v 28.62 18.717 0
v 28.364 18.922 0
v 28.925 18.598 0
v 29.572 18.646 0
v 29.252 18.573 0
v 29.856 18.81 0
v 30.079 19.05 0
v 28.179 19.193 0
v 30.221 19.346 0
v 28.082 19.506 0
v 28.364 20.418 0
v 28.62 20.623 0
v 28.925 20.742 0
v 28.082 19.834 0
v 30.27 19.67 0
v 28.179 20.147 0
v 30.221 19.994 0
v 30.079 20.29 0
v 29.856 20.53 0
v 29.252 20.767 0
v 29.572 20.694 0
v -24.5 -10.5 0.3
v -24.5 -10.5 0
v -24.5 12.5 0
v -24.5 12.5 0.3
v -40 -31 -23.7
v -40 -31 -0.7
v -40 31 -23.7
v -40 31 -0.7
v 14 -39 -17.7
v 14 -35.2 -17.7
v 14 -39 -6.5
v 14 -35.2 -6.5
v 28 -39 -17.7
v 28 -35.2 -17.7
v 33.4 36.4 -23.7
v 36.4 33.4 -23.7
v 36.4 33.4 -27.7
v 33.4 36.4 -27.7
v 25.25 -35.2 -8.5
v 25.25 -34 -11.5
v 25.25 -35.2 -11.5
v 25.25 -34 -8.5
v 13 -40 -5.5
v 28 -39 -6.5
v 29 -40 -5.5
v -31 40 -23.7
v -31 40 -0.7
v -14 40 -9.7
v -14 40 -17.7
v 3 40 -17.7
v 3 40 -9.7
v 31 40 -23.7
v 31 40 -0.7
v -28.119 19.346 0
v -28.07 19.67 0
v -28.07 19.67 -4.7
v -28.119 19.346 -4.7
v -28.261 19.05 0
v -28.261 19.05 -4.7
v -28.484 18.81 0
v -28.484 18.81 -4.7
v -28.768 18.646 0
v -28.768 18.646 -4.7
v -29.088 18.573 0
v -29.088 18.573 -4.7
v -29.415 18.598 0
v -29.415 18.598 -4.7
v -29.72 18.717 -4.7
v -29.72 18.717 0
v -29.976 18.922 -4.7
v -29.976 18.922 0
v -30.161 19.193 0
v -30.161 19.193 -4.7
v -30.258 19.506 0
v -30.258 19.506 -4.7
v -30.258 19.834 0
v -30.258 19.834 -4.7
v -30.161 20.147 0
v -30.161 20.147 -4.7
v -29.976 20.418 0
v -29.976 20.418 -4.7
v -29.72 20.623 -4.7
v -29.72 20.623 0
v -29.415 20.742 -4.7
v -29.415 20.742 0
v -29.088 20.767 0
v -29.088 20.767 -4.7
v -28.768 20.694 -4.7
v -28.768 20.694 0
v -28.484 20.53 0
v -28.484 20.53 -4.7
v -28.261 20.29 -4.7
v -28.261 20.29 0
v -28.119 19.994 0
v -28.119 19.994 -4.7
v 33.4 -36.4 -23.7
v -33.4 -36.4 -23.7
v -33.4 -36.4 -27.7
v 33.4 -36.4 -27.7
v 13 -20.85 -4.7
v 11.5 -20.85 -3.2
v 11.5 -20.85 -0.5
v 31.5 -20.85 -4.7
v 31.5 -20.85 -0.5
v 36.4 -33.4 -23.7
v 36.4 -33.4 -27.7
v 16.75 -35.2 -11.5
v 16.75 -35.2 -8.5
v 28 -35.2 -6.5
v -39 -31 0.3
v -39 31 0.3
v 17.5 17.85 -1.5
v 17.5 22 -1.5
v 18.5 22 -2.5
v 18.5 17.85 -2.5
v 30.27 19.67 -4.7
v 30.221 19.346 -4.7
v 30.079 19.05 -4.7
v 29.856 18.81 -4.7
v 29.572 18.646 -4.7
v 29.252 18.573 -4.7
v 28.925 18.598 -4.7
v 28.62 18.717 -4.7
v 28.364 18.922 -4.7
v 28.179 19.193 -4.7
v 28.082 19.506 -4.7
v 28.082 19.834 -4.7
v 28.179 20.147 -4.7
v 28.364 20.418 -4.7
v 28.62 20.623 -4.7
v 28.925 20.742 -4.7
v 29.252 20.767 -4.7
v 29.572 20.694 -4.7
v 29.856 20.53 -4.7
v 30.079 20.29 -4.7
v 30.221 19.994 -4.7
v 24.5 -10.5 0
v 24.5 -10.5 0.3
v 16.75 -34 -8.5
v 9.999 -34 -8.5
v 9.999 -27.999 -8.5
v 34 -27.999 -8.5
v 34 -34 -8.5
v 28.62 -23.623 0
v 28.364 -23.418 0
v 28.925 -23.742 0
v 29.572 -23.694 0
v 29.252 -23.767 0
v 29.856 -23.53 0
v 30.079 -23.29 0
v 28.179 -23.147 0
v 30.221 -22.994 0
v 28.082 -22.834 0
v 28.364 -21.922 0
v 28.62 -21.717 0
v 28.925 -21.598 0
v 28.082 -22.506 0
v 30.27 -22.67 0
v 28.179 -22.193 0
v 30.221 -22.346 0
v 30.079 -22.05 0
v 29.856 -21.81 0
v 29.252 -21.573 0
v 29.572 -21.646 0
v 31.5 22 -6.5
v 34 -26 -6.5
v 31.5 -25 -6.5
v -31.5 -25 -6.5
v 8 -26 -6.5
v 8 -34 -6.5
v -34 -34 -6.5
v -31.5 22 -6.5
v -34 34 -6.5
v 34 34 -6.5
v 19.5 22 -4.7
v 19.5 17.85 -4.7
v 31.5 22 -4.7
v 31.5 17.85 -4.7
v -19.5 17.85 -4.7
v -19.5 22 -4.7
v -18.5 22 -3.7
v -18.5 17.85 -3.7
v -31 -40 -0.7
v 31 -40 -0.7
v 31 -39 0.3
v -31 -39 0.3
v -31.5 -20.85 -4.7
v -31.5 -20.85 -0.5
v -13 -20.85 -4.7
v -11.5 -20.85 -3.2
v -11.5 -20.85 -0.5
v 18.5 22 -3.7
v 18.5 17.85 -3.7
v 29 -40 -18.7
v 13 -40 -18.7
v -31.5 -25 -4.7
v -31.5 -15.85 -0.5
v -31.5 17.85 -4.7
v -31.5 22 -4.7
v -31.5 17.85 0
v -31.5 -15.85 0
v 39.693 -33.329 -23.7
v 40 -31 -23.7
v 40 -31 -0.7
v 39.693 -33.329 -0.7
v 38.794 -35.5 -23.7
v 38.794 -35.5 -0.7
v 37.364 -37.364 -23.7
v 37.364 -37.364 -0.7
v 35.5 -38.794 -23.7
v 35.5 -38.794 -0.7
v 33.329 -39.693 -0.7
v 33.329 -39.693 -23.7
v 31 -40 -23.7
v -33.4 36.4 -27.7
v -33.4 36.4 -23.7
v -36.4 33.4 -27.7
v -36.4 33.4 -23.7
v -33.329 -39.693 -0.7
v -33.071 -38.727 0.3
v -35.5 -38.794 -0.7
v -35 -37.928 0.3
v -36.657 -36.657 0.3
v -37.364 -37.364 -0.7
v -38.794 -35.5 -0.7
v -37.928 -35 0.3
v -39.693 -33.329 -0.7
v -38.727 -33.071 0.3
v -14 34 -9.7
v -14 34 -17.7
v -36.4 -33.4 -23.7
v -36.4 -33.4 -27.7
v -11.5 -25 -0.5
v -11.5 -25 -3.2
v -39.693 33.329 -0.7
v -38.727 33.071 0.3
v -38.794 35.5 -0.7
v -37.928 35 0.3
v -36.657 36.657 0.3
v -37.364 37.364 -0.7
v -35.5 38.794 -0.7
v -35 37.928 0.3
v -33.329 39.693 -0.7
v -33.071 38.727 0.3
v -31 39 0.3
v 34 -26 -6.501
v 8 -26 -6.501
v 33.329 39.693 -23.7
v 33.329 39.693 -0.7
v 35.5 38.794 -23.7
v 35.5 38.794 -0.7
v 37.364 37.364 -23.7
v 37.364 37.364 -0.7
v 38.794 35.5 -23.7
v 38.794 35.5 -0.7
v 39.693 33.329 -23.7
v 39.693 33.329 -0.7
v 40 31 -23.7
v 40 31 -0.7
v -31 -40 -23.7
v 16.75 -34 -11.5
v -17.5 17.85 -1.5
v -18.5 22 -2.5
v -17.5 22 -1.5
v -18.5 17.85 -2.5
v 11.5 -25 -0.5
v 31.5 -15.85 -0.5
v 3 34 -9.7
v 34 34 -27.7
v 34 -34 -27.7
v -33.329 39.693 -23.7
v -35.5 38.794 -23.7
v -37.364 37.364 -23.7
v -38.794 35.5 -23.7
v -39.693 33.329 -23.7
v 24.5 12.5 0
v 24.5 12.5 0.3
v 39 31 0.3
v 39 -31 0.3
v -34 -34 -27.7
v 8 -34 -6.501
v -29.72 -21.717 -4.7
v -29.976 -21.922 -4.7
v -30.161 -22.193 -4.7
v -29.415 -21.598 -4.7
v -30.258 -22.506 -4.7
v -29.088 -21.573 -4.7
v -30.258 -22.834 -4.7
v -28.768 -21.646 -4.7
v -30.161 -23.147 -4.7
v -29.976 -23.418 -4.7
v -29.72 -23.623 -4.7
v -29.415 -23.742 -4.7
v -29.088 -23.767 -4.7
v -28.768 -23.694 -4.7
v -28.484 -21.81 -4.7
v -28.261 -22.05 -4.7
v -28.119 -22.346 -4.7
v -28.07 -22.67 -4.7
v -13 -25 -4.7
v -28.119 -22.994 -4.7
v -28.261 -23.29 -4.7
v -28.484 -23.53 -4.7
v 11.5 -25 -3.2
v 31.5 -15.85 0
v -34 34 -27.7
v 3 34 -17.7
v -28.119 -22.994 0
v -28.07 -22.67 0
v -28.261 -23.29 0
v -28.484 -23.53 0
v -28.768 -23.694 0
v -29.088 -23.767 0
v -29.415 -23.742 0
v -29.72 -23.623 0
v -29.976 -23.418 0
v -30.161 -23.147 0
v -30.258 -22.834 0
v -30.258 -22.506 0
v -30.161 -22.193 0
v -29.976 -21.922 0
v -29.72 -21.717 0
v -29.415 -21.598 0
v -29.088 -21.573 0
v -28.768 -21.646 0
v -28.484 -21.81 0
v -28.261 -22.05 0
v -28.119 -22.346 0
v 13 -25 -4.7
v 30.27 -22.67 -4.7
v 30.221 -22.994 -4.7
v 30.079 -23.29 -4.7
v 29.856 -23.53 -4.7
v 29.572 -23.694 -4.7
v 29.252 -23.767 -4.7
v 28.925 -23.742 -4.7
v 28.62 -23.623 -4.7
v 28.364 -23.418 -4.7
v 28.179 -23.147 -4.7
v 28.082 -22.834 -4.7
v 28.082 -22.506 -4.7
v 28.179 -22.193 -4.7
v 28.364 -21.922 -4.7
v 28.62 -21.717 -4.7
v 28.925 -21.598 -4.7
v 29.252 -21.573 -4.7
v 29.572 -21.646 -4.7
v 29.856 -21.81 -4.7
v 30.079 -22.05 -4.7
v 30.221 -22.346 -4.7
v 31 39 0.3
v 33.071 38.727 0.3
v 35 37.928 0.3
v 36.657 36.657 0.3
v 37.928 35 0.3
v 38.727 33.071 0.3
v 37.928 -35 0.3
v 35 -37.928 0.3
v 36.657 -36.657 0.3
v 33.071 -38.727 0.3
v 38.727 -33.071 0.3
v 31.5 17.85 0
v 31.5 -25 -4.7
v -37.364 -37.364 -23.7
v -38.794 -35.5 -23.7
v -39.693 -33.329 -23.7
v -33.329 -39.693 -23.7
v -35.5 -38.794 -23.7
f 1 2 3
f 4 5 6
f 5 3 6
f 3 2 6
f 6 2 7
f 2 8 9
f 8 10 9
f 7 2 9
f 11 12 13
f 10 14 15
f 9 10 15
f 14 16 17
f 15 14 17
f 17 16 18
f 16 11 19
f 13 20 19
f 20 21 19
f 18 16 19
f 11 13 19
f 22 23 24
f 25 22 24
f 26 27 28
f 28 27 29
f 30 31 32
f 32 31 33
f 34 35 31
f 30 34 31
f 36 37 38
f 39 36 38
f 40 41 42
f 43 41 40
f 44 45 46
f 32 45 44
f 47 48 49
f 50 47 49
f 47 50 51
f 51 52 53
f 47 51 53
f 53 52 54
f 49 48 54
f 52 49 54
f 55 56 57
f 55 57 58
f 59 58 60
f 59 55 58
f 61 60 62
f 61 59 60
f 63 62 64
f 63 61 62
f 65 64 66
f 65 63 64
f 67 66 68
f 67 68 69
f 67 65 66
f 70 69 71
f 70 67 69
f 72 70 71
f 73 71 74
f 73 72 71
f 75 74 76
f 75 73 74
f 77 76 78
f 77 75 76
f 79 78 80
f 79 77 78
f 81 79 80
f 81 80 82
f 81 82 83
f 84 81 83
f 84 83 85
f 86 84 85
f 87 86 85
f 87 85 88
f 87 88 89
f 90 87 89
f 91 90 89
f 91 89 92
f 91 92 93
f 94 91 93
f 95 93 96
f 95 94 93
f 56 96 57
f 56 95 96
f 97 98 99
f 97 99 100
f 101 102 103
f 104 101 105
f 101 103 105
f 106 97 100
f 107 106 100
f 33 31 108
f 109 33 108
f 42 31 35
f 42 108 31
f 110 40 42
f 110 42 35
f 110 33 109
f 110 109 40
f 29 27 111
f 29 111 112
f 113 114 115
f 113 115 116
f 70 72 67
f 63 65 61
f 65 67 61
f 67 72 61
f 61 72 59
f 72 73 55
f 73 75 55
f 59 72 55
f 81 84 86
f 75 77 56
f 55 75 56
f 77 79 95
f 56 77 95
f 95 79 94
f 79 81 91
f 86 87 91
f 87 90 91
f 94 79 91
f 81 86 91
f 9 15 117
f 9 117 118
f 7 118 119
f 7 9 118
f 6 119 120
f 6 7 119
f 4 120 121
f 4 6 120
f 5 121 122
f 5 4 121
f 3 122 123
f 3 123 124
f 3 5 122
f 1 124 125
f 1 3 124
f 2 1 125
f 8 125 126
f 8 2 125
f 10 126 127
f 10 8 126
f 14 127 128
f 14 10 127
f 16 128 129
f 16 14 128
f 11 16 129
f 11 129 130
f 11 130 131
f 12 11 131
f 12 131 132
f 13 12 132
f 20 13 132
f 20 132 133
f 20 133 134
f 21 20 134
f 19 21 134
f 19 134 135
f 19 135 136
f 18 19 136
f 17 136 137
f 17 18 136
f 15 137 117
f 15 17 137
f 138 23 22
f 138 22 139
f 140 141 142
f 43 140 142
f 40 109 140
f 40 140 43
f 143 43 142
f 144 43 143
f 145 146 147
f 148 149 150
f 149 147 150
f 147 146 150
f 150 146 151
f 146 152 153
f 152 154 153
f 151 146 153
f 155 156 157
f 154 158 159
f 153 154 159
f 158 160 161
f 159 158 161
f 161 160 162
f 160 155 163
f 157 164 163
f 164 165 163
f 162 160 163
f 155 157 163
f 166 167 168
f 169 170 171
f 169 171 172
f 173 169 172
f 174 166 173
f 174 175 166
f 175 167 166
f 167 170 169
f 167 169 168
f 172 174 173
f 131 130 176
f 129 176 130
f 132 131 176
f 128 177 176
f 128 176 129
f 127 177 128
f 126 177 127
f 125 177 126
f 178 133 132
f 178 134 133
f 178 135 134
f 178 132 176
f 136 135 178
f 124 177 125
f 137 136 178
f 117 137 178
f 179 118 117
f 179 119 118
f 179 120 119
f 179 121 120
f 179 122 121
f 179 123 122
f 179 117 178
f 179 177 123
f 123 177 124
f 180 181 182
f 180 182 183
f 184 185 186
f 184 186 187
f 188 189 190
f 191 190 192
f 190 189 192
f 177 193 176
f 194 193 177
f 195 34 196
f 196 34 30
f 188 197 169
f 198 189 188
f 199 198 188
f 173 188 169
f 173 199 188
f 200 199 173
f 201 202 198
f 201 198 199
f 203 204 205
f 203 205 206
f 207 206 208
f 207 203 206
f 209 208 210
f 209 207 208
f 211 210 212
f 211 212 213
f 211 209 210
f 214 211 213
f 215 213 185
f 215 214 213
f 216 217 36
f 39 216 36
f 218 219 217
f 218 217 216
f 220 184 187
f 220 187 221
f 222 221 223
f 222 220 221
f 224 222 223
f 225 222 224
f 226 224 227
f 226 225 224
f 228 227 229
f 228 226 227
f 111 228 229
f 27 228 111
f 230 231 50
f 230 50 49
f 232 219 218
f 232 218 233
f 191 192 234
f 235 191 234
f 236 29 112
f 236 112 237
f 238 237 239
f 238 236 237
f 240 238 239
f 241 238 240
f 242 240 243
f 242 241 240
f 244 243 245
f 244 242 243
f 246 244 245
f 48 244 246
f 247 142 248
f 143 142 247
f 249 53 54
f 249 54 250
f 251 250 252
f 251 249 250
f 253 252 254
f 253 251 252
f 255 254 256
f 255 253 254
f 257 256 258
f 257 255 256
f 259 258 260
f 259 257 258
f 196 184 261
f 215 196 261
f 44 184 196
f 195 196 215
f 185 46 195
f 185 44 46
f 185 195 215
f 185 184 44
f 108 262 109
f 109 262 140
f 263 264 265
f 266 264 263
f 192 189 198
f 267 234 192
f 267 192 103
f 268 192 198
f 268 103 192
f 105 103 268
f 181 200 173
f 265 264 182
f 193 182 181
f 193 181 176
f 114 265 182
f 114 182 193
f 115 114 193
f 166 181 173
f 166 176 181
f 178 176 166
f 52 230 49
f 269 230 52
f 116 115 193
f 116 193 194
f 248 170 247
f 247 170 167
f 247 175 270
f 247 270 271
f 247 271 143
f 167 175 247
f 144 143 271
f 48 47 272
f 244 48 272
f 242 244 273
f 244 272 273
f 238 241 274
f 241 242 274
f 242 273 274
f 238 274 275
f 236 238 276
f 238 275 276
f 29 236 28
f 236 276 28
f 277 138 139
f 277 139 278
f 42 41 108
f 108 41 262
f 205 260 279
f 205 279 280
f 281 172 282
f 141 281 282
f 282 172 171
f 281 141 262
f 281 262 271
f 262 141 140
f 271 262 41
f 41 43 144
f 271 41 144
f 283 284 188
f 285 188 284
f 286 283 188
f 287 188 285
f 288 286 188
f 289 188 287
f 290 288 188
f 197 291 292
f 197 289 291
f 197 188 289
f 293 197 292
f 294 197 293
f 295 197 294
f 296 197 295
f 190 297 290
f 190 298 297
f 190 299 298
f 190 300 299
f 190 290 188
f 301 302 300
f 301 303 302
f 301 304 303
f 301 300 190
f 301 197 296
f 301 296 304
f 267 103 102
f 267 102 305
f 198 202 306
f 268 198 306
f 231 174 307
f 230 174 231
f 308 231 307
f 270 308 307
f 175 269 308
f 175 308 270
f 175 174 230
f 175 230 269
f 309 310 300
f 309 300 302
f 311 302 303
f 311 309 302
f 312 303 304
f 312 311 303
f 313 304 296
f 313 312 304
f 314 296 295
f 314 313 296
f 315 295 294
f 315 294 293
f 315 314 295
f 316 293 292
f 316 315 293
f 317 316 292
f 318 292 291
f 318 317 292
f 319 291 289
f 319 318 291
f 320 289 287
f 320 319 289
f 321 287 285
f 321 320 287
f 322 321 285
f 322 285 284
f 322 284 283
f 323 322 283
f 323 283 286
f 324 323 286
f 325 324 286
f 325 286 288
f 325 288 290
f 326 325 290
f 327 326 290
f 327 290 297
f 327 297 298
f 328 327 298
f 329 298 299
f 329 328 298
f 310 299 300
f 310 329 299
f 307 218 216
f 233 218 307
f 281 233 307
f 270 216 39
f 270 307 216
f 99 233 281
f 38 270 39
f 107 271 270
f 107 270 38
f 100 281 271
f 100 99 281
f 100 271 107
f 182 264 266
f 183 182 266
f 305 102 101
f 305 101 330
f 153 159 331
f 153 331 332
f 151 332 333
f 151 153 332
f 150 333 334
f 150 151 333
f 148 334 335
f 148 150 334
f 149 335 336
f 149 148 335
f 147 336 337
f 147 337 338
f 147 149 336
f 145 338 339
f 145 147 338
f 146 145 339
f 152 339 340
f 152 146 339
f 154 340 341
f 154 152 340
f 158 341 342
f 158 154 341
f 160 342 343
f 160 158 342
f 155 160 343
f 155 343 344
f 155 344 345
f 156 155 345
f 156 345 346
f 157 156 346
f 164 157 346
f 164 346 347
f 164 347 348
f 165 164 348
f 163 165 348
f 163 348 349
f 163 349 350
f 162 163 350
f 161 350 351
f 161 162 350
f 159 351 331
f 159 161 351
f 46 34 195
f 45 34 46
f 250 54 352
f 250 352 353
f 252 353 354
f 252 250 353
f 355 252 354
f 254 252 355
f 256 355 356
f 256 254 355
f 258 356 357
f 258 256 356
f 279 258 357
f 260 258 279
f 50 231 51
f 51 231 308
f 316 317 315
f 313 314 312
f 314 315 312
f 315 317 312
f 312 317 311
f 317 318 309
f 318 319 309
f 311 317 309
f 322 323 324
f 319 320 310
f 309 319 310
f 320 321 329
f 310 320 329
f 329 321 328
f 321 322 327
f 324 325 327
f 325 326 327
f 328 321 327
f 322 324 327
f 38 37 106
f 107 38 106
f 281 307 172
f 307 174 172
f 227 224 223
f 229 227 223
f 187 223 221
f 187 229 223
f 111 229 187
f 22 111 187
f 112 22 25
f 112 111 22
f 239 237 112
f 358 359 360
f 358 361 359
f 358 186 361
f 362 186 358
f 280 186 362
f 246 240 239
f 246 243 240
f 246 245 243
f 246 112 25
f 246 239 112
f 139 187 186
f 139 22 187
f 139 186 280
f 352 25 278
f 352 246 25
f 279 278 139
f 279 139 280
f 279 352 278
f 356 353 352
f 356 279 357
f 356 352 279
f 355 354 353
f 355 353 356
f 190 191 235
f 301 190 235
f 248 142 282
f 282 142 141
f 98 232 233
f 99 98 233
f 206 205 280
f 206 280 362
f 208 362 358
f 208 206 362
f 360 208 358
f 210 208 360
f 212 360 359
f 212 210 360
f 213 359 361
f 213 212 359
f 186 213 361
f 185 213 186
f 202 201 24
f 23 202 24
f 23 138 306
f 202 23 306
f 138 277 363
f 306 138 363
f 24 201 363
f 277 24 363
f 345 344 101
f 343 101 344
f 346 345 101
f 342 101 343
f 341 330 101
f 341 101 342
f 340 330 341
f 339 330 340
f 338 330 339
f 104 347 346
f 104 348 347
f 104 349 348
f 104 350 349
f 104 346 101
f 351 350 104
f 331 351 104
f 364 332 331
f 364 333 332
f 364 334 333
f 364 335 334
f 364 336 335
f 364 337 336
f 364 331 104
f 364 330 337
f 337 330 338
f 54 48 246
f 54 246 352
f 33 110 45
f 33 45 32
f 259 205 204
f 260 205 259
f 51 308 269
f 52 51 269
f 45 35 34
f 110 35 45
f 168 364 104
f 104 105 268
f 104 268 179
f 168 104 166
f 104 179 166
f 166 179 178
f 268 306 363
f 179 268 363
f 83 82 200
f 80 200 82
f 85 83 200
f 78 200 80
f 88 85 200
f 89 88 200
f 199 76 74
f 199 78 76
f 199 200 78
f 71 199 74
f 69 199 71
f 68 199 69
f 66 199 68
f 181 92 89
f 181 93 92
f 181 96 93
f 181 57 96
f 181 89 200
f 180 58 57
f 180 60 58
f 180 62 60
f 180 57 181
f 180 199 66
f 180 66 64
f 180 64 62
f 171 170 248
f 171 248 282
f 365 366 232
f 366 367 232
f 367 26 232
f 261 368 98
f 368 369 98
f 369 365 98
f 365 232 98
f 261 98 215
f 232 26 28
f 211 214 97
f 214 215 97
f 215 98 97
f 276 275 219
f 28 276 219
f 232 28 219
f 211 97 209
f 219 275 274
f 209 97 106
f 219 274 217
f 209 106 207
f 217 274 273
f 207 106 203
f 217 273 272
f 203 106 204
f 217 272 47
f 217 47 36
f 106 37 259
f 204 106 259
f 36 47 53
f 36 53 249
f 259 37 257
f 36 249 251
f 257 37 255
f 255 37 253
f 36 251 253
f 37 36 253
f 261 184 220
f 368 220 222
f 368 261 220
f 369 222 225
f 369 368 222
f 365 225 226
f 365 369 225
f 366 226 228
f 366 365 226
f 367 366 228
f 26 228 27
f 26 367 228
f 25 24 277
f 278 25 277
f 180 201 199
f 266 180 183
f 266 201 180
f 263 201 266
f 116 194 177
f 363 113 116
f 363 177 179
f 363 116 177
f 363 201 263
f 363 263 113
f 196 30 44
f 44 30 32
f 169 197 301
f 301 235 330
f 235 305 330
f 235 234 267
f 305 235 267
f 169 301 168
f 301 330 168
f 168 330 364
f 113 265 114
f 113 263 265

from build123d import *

# Parameters (mm, degrees)
SKETCH_W        = 63
SKETCH_H        = 47
SKETCH_W_2      = 49
SKETCH_H_2      = 23
PAD_DEPTH       = 0.3
SKETCH001_W     = 65
SKETCH001_H     = 49
SKETCH001_W_2   = 63
SKETCH001_H_2   = 47
PAD001_DEPTH    = 6.8
SKETCH002_W     = 4.15
SKETCH002_H     = 4.15
SKETCH002_R     = 1.1
PAD002_DEPTH    = 4.7
SKETCH003_W     = 8.85
SKETCH003_H     = 4.15
SKETCH003_W_2   = 15.85
PAD003_DEPTH    = 4.7
SKETCH004_W     = 37
SKETCH004_H     = 4.15
PAD004_DEPTH    = 1.5
CHAMFER_SIZE    = 1
PAD005_DEPTH    = 0.5
CHAMFER001_SIZE = 1.5
SKETCH006_W     = 80
SKETCH006_H     = 80
SKETCH006_W_2   = 65
SKETCH006_H_2   = 49
PAD006_DEPTH    = 24
SKETCH007_W     = 68
SKETCH007_H     = 68
SKETCH007_W_2   = 65
SKETCH007_H_2   = 49
POCKET_DEPTH    = 17.2
SKETCH008_W     = 14
SKETCH008_H     = 11.2
POCKET001_DEPTH = 6
SKETCH009_W     = 17
SKETCH009_H     = 8
POCKET002_DEPTH = 6
SKETCH010_W     = 26
SKETCH010_H     = 8
PAD007_DEPTH    = 2
CHAMFER002_SIZE = 1.999
SKETCH011_W     = 14
SKETCH011_H     = 1.2
PAD008_DEPTH    = 11.2
SKETCH012_W     = 8.5
SKETCH012_H     = 3
POCKET003_DEPTH = 1.2
SKETCH013_W     = 72.8
SKETCH013_H     = 72.8
SKETCH013_W_2   = 68
SKETCH013_H_2   = 68
PAD009_DEPTH    = 4
FILLET_R        = 9
CHAMFER003_SIZE = 3
CHAMFER004_SIZE = 1
CHAMFER005_SIZE = 1


with BuildPart() as part:
    # Sketch → Pad (new body)
    with BuildSketch(Plane.XY):
        with Locations((0, -1.5)):
            Rectangle(SKETCH_W, SKETCH_H)
        with Locations((0, 1)):
            Rectangle(SKETCH_W_2, SKETCH_H_2, mode=Mode.SUBTRACT)
    extrude(amount=PAD_DEPTH)

    # Sketch001 (on Face10 of Pad) → Pad001 (join)
    with BuildSketch(Plane.XY.offset(0.3)):
        with Locations((0, -1.5)):
            Rectangle(SKETCH001_W, SKETCH001_H)
        with Locations((0, -1.5)):
            Rectangle(SKETCH001_W_2, SKETCH001_H_2, mode=Mode.SUBTRACT)
    extrude(amount=-PAD001_DEPTH)

    # Sketch002 (on Face4 of Pad001) → Pad002 (join)
    with BuildSketch(Plane(origin=(0, 0, 0), x_dir=(1, 0, 0), z_dir=(0, 0, -1))):
        with Locations((-29.425, 22.925)):
            Rectangle(SKETCH002_W, SKETCH002_H)
        with Locations((-29.17, 22.67)):
            Circle(SKETCH002_R, mode=Mode.SUBTRACT)
        with Locations((-29.425, -19.925)):
            Rectangle(SKETCH002_W, SKETCH002_H)
        with Locations((-29.17, -19.67)):
            Circle(SKETCH002_R, mode=Mode.SUBTRACT)
        with Locations((29.425, -19.925)):
            Rectangle(SKETCH002_W, SKETCH002_H)
        with Locations((29.17, -19.67)):
            Circle(SKETCH002_R, mode=Mode.SUBTRACT)
        with Locations((29.425, 22.925)):
            Rectangle(SKETCH002_W, SKETCH002_H)
        with Locations((29.17, 22.67)):
            Circle(SKETCH002_R, mode=Mode.SUBTRACT)
    extrude(amount=PAD002_DEPTH)

    # Sketch003 (on Face4 of Pad002) → Pad003 (join)
    with BuildSketch(Plane(origin=(0, 0, 0), x_dir=(1, 0, 0), z_dir=(0, 0, -1))):
        with Locations((-22.925, -19.925)):
            Rectangle(SKETCH003_W, SKETCH003_H)
        with Locations((22.925, -19.925)):
            Rectangle(SKETCH003_W, SKETCH003_H)
        with Locations((-19.425, 22.925)):
            Rectangle(SKETCH003_W_2, SKETCH003_H)
        with Locations((19.425, 22.925)):
            Rectangle(SKETCH003_W_2, SKETCH003_H)
    extrude(amount=PAD003_DEPTH)

    # Sketch004 (on Face4 of Pad003) → Pad004 (join)
    with BuildSketch(Plane(origin=(0, 0, 0), x_dir=(1, 0, 0), z_dir=(0, 0, -1))):
        with Locations((0, -19.925)):
            Rectangle(SKETCH004_W, SKETCH004_H)
    extrude(amount=PAD004_DEPTH)

    # Chamfer
    chamfer_edges = [part.edges().sort_by_distance(p)[0] for p in [
        (-18.5, 19.925, -1.5),
        (18.5, 19.925, -1.5),
        (-18.5, 19.925, -4.7),
        (18.5, 19.925, -4.7),
    ]]
    chamfer(chamfer_edges, length=CHAMFER_SIZE)

    # Sketch005 (on Face6 of Chamfer) → Pad005 (join)
    with BuildSketch(Plane(origin=(0, 0, 0), x_dir=(1, 0, 0), z_dir=(0, 0, -1))):
        Polygon((11.5, 20.85), (11.5, 25), (-11.5, 25), (-11.5, 20.85), (-31.5, 20.85), (-31.5, 15.85), (31.5, 15.85), (31.5, 20.85), align=None)
    extrude(amount=PAD005_DEPTH)

    # Chamfer001
    chamfer001_edges = [part.edges().sort_by_distance(p)[0] for p in [
        (-11.5, -22.925, -4.7),
        (11.5, -22.925, -4.7),
    ]]
    chamfer(chamfer001_edges, length=CHAMFER001_SIZE)

    # Sketch006 (on Face52 of Chamfer001) → Pad006 (join)
    with BuildSketch(Plane.XY.offset(0.3)):
        Rectangle(SKETCH006_W, SKETCH006_H)
        with Locations((0, -1.5)):
            Rectangle(SKETCH006_W_2, SKETCH006_H_2, mode=Mode.SUBTRACT)
    extrude(amount=-PAD006_DEPTH)

    # Sketch007 (on Face49 of Pad006) → Pocket (cut)
    with BuildSketch(Plane(origin=(0, 0, -23.7), x_dir=(1, 0, 0), z_dir=(0, 0, -1))):
        Rectangle(SKETCH007_W, SKETCH007_H)
        with Locations((0, 1.5)):
            Rectangle(SKETCH007_W_2, SKETCH007_H_2, mode=Mode.SUBTRACT)
    extrude(amount=-POCKET_DEPTH, mode=Mode.SUBTRACT)

    # Sketch008 (on Face49 of Pocket) → Pocket001 (cut)
    with BuildSketch(Plane(origin=(0, -34, 0), x_dir=(-1, 0, 0), z_dir=(0, 1, 0))):
        with Locations((-21, -12.1)):
            Rectangle(SKETCH008_W, SKETCH008_H)
    extrude(amount=-POCKET001_DEPTH, mode=Mode.SUBTRACT)

    # Sketch009 (on Face47 of Pocket001) → Pocket002 (cut)
    with BuildSketch(Plane.XZ.offset(-34)):
        with Locations((-5.5, -13.7)):
            Rectangle(SKETCH009_W, SKETCH009_H)
    extrude(amount=-POCKET002_DEPTH, mode=Mode.SUBTRACT)

    # Sketch010 (on Face24 of Pocket002) → Pad007 (join)
    with BuildSketch(Plane(origin=(0, 0, -6.5), x_dir=(1, 0, 0), z_dir=(0, 0, -1))):
        with Locations((21, 30)):
            Rectangle(SKETCH010_W, SKETCH010_H)
    extrude(amount=PAD007_DEPTH)

    # Chamfer002
    chamfer002_edges = [part.edges().sort_by_distance(p)[0] for p in [
        (21, -26, -8.5),
        (8, -30, -8.5),
    ]]
    chamfer(chamfer002_edges, length=CHAMFER002_SIZE)

    # Sketch011 (on Face55 of Chamfer002) → Pad008 (join)
    with BuildSketch(Plane(origin=(0, 0, -6.5), x_dir=(1, 0, 0), z_dir=(0, 0, -1))):
        with Locations((21, 34.6)):
            Rectangle(SKETCH011_W, SKETCH011_H)
    extrude(amount=PAD008_DEPTH)

    # Sketch012 (on Face17 of Pad008) → Pocket003 (cut)
    with BuildSketch(Plane(origin=(0, -34, 0), x_dir=(-1, 0, 0), z_dir=(0, 1, 0))):
        with Locations((-21, -10)):
            Rectangle(SKETCH012_W, SKETCH012_H)
    extrude(amount=-POCKET003_DEPTH, mode=Mode.SUBTRACT)

    # Sketch013 (on Face15 of Pocket003) → Pad009 (join)
    with BuildSketch(Plane(origin=(0, 0, -23.7), x_dir=(1, 0, 0), z_dir=(0, 0, -1))):
        Rectangle(SKETCH013_W, SKETCH013_H)
        Rectangle(SKETCH013_W_2, SKETCH013_H_2, mode=Mode.SUBTRACT)
    extrude(amount=PAD009_DEPTH)

    # Fillet
    fillet_edges = [part.edges().sort_by_distance(p)[0] for p in [
        (-40, -40, -11.7),
        (40, -40, -11.7),
        (40, 40, -11.7),
        (-40, 40, -11.7),
    ]]
    fillet(fillet_edges, radius=FILLET_R)

    # Chamfer003
    chamfer003_edges = [part.edges().sort_by_distance(p)[0] for p in [
        (36.4, 36.4, -25.7),
        (-36.4, 36.4, -25.7),
        (36.4, -36.4, -25.7),
        (-36.4, -36.4, -25.7),
    ]]
    chamfer(chamfer003_edges, length=CHAMFER003_SIZE)

    # Chamfer004
    chamfer004_edges = [part.edges().sort_by_distance(p)[0] for p in [
        (28, -40, -12.1),
        (21, -40, -17.7),
        (14, -40, -12.1),
        (21, -40, -6.5),
    ]]
    chamfer(chamfer004_edges, length=CHAMFER004_SIZE)

    # Chamfer005
    chamfer005_edges = [part.edges().sort_by_distance(p)[0] for p in [
        (-37.363961, -37.363961, 0.3),
        (-40, 0, 0.3),
        (-37.363961, 37.363961, 0.3),
        (0, 40, 0.3),
        (0, -40, 0.3),
        (37.363961, -37.363961, 0.3),
        (40, 0, 0.3),
        (37.363961, 37.363961, 0.3),
    ]]
    chamfer(chamfer005_edges, length=CHAMFER005_SIZE)


solid = part.part
